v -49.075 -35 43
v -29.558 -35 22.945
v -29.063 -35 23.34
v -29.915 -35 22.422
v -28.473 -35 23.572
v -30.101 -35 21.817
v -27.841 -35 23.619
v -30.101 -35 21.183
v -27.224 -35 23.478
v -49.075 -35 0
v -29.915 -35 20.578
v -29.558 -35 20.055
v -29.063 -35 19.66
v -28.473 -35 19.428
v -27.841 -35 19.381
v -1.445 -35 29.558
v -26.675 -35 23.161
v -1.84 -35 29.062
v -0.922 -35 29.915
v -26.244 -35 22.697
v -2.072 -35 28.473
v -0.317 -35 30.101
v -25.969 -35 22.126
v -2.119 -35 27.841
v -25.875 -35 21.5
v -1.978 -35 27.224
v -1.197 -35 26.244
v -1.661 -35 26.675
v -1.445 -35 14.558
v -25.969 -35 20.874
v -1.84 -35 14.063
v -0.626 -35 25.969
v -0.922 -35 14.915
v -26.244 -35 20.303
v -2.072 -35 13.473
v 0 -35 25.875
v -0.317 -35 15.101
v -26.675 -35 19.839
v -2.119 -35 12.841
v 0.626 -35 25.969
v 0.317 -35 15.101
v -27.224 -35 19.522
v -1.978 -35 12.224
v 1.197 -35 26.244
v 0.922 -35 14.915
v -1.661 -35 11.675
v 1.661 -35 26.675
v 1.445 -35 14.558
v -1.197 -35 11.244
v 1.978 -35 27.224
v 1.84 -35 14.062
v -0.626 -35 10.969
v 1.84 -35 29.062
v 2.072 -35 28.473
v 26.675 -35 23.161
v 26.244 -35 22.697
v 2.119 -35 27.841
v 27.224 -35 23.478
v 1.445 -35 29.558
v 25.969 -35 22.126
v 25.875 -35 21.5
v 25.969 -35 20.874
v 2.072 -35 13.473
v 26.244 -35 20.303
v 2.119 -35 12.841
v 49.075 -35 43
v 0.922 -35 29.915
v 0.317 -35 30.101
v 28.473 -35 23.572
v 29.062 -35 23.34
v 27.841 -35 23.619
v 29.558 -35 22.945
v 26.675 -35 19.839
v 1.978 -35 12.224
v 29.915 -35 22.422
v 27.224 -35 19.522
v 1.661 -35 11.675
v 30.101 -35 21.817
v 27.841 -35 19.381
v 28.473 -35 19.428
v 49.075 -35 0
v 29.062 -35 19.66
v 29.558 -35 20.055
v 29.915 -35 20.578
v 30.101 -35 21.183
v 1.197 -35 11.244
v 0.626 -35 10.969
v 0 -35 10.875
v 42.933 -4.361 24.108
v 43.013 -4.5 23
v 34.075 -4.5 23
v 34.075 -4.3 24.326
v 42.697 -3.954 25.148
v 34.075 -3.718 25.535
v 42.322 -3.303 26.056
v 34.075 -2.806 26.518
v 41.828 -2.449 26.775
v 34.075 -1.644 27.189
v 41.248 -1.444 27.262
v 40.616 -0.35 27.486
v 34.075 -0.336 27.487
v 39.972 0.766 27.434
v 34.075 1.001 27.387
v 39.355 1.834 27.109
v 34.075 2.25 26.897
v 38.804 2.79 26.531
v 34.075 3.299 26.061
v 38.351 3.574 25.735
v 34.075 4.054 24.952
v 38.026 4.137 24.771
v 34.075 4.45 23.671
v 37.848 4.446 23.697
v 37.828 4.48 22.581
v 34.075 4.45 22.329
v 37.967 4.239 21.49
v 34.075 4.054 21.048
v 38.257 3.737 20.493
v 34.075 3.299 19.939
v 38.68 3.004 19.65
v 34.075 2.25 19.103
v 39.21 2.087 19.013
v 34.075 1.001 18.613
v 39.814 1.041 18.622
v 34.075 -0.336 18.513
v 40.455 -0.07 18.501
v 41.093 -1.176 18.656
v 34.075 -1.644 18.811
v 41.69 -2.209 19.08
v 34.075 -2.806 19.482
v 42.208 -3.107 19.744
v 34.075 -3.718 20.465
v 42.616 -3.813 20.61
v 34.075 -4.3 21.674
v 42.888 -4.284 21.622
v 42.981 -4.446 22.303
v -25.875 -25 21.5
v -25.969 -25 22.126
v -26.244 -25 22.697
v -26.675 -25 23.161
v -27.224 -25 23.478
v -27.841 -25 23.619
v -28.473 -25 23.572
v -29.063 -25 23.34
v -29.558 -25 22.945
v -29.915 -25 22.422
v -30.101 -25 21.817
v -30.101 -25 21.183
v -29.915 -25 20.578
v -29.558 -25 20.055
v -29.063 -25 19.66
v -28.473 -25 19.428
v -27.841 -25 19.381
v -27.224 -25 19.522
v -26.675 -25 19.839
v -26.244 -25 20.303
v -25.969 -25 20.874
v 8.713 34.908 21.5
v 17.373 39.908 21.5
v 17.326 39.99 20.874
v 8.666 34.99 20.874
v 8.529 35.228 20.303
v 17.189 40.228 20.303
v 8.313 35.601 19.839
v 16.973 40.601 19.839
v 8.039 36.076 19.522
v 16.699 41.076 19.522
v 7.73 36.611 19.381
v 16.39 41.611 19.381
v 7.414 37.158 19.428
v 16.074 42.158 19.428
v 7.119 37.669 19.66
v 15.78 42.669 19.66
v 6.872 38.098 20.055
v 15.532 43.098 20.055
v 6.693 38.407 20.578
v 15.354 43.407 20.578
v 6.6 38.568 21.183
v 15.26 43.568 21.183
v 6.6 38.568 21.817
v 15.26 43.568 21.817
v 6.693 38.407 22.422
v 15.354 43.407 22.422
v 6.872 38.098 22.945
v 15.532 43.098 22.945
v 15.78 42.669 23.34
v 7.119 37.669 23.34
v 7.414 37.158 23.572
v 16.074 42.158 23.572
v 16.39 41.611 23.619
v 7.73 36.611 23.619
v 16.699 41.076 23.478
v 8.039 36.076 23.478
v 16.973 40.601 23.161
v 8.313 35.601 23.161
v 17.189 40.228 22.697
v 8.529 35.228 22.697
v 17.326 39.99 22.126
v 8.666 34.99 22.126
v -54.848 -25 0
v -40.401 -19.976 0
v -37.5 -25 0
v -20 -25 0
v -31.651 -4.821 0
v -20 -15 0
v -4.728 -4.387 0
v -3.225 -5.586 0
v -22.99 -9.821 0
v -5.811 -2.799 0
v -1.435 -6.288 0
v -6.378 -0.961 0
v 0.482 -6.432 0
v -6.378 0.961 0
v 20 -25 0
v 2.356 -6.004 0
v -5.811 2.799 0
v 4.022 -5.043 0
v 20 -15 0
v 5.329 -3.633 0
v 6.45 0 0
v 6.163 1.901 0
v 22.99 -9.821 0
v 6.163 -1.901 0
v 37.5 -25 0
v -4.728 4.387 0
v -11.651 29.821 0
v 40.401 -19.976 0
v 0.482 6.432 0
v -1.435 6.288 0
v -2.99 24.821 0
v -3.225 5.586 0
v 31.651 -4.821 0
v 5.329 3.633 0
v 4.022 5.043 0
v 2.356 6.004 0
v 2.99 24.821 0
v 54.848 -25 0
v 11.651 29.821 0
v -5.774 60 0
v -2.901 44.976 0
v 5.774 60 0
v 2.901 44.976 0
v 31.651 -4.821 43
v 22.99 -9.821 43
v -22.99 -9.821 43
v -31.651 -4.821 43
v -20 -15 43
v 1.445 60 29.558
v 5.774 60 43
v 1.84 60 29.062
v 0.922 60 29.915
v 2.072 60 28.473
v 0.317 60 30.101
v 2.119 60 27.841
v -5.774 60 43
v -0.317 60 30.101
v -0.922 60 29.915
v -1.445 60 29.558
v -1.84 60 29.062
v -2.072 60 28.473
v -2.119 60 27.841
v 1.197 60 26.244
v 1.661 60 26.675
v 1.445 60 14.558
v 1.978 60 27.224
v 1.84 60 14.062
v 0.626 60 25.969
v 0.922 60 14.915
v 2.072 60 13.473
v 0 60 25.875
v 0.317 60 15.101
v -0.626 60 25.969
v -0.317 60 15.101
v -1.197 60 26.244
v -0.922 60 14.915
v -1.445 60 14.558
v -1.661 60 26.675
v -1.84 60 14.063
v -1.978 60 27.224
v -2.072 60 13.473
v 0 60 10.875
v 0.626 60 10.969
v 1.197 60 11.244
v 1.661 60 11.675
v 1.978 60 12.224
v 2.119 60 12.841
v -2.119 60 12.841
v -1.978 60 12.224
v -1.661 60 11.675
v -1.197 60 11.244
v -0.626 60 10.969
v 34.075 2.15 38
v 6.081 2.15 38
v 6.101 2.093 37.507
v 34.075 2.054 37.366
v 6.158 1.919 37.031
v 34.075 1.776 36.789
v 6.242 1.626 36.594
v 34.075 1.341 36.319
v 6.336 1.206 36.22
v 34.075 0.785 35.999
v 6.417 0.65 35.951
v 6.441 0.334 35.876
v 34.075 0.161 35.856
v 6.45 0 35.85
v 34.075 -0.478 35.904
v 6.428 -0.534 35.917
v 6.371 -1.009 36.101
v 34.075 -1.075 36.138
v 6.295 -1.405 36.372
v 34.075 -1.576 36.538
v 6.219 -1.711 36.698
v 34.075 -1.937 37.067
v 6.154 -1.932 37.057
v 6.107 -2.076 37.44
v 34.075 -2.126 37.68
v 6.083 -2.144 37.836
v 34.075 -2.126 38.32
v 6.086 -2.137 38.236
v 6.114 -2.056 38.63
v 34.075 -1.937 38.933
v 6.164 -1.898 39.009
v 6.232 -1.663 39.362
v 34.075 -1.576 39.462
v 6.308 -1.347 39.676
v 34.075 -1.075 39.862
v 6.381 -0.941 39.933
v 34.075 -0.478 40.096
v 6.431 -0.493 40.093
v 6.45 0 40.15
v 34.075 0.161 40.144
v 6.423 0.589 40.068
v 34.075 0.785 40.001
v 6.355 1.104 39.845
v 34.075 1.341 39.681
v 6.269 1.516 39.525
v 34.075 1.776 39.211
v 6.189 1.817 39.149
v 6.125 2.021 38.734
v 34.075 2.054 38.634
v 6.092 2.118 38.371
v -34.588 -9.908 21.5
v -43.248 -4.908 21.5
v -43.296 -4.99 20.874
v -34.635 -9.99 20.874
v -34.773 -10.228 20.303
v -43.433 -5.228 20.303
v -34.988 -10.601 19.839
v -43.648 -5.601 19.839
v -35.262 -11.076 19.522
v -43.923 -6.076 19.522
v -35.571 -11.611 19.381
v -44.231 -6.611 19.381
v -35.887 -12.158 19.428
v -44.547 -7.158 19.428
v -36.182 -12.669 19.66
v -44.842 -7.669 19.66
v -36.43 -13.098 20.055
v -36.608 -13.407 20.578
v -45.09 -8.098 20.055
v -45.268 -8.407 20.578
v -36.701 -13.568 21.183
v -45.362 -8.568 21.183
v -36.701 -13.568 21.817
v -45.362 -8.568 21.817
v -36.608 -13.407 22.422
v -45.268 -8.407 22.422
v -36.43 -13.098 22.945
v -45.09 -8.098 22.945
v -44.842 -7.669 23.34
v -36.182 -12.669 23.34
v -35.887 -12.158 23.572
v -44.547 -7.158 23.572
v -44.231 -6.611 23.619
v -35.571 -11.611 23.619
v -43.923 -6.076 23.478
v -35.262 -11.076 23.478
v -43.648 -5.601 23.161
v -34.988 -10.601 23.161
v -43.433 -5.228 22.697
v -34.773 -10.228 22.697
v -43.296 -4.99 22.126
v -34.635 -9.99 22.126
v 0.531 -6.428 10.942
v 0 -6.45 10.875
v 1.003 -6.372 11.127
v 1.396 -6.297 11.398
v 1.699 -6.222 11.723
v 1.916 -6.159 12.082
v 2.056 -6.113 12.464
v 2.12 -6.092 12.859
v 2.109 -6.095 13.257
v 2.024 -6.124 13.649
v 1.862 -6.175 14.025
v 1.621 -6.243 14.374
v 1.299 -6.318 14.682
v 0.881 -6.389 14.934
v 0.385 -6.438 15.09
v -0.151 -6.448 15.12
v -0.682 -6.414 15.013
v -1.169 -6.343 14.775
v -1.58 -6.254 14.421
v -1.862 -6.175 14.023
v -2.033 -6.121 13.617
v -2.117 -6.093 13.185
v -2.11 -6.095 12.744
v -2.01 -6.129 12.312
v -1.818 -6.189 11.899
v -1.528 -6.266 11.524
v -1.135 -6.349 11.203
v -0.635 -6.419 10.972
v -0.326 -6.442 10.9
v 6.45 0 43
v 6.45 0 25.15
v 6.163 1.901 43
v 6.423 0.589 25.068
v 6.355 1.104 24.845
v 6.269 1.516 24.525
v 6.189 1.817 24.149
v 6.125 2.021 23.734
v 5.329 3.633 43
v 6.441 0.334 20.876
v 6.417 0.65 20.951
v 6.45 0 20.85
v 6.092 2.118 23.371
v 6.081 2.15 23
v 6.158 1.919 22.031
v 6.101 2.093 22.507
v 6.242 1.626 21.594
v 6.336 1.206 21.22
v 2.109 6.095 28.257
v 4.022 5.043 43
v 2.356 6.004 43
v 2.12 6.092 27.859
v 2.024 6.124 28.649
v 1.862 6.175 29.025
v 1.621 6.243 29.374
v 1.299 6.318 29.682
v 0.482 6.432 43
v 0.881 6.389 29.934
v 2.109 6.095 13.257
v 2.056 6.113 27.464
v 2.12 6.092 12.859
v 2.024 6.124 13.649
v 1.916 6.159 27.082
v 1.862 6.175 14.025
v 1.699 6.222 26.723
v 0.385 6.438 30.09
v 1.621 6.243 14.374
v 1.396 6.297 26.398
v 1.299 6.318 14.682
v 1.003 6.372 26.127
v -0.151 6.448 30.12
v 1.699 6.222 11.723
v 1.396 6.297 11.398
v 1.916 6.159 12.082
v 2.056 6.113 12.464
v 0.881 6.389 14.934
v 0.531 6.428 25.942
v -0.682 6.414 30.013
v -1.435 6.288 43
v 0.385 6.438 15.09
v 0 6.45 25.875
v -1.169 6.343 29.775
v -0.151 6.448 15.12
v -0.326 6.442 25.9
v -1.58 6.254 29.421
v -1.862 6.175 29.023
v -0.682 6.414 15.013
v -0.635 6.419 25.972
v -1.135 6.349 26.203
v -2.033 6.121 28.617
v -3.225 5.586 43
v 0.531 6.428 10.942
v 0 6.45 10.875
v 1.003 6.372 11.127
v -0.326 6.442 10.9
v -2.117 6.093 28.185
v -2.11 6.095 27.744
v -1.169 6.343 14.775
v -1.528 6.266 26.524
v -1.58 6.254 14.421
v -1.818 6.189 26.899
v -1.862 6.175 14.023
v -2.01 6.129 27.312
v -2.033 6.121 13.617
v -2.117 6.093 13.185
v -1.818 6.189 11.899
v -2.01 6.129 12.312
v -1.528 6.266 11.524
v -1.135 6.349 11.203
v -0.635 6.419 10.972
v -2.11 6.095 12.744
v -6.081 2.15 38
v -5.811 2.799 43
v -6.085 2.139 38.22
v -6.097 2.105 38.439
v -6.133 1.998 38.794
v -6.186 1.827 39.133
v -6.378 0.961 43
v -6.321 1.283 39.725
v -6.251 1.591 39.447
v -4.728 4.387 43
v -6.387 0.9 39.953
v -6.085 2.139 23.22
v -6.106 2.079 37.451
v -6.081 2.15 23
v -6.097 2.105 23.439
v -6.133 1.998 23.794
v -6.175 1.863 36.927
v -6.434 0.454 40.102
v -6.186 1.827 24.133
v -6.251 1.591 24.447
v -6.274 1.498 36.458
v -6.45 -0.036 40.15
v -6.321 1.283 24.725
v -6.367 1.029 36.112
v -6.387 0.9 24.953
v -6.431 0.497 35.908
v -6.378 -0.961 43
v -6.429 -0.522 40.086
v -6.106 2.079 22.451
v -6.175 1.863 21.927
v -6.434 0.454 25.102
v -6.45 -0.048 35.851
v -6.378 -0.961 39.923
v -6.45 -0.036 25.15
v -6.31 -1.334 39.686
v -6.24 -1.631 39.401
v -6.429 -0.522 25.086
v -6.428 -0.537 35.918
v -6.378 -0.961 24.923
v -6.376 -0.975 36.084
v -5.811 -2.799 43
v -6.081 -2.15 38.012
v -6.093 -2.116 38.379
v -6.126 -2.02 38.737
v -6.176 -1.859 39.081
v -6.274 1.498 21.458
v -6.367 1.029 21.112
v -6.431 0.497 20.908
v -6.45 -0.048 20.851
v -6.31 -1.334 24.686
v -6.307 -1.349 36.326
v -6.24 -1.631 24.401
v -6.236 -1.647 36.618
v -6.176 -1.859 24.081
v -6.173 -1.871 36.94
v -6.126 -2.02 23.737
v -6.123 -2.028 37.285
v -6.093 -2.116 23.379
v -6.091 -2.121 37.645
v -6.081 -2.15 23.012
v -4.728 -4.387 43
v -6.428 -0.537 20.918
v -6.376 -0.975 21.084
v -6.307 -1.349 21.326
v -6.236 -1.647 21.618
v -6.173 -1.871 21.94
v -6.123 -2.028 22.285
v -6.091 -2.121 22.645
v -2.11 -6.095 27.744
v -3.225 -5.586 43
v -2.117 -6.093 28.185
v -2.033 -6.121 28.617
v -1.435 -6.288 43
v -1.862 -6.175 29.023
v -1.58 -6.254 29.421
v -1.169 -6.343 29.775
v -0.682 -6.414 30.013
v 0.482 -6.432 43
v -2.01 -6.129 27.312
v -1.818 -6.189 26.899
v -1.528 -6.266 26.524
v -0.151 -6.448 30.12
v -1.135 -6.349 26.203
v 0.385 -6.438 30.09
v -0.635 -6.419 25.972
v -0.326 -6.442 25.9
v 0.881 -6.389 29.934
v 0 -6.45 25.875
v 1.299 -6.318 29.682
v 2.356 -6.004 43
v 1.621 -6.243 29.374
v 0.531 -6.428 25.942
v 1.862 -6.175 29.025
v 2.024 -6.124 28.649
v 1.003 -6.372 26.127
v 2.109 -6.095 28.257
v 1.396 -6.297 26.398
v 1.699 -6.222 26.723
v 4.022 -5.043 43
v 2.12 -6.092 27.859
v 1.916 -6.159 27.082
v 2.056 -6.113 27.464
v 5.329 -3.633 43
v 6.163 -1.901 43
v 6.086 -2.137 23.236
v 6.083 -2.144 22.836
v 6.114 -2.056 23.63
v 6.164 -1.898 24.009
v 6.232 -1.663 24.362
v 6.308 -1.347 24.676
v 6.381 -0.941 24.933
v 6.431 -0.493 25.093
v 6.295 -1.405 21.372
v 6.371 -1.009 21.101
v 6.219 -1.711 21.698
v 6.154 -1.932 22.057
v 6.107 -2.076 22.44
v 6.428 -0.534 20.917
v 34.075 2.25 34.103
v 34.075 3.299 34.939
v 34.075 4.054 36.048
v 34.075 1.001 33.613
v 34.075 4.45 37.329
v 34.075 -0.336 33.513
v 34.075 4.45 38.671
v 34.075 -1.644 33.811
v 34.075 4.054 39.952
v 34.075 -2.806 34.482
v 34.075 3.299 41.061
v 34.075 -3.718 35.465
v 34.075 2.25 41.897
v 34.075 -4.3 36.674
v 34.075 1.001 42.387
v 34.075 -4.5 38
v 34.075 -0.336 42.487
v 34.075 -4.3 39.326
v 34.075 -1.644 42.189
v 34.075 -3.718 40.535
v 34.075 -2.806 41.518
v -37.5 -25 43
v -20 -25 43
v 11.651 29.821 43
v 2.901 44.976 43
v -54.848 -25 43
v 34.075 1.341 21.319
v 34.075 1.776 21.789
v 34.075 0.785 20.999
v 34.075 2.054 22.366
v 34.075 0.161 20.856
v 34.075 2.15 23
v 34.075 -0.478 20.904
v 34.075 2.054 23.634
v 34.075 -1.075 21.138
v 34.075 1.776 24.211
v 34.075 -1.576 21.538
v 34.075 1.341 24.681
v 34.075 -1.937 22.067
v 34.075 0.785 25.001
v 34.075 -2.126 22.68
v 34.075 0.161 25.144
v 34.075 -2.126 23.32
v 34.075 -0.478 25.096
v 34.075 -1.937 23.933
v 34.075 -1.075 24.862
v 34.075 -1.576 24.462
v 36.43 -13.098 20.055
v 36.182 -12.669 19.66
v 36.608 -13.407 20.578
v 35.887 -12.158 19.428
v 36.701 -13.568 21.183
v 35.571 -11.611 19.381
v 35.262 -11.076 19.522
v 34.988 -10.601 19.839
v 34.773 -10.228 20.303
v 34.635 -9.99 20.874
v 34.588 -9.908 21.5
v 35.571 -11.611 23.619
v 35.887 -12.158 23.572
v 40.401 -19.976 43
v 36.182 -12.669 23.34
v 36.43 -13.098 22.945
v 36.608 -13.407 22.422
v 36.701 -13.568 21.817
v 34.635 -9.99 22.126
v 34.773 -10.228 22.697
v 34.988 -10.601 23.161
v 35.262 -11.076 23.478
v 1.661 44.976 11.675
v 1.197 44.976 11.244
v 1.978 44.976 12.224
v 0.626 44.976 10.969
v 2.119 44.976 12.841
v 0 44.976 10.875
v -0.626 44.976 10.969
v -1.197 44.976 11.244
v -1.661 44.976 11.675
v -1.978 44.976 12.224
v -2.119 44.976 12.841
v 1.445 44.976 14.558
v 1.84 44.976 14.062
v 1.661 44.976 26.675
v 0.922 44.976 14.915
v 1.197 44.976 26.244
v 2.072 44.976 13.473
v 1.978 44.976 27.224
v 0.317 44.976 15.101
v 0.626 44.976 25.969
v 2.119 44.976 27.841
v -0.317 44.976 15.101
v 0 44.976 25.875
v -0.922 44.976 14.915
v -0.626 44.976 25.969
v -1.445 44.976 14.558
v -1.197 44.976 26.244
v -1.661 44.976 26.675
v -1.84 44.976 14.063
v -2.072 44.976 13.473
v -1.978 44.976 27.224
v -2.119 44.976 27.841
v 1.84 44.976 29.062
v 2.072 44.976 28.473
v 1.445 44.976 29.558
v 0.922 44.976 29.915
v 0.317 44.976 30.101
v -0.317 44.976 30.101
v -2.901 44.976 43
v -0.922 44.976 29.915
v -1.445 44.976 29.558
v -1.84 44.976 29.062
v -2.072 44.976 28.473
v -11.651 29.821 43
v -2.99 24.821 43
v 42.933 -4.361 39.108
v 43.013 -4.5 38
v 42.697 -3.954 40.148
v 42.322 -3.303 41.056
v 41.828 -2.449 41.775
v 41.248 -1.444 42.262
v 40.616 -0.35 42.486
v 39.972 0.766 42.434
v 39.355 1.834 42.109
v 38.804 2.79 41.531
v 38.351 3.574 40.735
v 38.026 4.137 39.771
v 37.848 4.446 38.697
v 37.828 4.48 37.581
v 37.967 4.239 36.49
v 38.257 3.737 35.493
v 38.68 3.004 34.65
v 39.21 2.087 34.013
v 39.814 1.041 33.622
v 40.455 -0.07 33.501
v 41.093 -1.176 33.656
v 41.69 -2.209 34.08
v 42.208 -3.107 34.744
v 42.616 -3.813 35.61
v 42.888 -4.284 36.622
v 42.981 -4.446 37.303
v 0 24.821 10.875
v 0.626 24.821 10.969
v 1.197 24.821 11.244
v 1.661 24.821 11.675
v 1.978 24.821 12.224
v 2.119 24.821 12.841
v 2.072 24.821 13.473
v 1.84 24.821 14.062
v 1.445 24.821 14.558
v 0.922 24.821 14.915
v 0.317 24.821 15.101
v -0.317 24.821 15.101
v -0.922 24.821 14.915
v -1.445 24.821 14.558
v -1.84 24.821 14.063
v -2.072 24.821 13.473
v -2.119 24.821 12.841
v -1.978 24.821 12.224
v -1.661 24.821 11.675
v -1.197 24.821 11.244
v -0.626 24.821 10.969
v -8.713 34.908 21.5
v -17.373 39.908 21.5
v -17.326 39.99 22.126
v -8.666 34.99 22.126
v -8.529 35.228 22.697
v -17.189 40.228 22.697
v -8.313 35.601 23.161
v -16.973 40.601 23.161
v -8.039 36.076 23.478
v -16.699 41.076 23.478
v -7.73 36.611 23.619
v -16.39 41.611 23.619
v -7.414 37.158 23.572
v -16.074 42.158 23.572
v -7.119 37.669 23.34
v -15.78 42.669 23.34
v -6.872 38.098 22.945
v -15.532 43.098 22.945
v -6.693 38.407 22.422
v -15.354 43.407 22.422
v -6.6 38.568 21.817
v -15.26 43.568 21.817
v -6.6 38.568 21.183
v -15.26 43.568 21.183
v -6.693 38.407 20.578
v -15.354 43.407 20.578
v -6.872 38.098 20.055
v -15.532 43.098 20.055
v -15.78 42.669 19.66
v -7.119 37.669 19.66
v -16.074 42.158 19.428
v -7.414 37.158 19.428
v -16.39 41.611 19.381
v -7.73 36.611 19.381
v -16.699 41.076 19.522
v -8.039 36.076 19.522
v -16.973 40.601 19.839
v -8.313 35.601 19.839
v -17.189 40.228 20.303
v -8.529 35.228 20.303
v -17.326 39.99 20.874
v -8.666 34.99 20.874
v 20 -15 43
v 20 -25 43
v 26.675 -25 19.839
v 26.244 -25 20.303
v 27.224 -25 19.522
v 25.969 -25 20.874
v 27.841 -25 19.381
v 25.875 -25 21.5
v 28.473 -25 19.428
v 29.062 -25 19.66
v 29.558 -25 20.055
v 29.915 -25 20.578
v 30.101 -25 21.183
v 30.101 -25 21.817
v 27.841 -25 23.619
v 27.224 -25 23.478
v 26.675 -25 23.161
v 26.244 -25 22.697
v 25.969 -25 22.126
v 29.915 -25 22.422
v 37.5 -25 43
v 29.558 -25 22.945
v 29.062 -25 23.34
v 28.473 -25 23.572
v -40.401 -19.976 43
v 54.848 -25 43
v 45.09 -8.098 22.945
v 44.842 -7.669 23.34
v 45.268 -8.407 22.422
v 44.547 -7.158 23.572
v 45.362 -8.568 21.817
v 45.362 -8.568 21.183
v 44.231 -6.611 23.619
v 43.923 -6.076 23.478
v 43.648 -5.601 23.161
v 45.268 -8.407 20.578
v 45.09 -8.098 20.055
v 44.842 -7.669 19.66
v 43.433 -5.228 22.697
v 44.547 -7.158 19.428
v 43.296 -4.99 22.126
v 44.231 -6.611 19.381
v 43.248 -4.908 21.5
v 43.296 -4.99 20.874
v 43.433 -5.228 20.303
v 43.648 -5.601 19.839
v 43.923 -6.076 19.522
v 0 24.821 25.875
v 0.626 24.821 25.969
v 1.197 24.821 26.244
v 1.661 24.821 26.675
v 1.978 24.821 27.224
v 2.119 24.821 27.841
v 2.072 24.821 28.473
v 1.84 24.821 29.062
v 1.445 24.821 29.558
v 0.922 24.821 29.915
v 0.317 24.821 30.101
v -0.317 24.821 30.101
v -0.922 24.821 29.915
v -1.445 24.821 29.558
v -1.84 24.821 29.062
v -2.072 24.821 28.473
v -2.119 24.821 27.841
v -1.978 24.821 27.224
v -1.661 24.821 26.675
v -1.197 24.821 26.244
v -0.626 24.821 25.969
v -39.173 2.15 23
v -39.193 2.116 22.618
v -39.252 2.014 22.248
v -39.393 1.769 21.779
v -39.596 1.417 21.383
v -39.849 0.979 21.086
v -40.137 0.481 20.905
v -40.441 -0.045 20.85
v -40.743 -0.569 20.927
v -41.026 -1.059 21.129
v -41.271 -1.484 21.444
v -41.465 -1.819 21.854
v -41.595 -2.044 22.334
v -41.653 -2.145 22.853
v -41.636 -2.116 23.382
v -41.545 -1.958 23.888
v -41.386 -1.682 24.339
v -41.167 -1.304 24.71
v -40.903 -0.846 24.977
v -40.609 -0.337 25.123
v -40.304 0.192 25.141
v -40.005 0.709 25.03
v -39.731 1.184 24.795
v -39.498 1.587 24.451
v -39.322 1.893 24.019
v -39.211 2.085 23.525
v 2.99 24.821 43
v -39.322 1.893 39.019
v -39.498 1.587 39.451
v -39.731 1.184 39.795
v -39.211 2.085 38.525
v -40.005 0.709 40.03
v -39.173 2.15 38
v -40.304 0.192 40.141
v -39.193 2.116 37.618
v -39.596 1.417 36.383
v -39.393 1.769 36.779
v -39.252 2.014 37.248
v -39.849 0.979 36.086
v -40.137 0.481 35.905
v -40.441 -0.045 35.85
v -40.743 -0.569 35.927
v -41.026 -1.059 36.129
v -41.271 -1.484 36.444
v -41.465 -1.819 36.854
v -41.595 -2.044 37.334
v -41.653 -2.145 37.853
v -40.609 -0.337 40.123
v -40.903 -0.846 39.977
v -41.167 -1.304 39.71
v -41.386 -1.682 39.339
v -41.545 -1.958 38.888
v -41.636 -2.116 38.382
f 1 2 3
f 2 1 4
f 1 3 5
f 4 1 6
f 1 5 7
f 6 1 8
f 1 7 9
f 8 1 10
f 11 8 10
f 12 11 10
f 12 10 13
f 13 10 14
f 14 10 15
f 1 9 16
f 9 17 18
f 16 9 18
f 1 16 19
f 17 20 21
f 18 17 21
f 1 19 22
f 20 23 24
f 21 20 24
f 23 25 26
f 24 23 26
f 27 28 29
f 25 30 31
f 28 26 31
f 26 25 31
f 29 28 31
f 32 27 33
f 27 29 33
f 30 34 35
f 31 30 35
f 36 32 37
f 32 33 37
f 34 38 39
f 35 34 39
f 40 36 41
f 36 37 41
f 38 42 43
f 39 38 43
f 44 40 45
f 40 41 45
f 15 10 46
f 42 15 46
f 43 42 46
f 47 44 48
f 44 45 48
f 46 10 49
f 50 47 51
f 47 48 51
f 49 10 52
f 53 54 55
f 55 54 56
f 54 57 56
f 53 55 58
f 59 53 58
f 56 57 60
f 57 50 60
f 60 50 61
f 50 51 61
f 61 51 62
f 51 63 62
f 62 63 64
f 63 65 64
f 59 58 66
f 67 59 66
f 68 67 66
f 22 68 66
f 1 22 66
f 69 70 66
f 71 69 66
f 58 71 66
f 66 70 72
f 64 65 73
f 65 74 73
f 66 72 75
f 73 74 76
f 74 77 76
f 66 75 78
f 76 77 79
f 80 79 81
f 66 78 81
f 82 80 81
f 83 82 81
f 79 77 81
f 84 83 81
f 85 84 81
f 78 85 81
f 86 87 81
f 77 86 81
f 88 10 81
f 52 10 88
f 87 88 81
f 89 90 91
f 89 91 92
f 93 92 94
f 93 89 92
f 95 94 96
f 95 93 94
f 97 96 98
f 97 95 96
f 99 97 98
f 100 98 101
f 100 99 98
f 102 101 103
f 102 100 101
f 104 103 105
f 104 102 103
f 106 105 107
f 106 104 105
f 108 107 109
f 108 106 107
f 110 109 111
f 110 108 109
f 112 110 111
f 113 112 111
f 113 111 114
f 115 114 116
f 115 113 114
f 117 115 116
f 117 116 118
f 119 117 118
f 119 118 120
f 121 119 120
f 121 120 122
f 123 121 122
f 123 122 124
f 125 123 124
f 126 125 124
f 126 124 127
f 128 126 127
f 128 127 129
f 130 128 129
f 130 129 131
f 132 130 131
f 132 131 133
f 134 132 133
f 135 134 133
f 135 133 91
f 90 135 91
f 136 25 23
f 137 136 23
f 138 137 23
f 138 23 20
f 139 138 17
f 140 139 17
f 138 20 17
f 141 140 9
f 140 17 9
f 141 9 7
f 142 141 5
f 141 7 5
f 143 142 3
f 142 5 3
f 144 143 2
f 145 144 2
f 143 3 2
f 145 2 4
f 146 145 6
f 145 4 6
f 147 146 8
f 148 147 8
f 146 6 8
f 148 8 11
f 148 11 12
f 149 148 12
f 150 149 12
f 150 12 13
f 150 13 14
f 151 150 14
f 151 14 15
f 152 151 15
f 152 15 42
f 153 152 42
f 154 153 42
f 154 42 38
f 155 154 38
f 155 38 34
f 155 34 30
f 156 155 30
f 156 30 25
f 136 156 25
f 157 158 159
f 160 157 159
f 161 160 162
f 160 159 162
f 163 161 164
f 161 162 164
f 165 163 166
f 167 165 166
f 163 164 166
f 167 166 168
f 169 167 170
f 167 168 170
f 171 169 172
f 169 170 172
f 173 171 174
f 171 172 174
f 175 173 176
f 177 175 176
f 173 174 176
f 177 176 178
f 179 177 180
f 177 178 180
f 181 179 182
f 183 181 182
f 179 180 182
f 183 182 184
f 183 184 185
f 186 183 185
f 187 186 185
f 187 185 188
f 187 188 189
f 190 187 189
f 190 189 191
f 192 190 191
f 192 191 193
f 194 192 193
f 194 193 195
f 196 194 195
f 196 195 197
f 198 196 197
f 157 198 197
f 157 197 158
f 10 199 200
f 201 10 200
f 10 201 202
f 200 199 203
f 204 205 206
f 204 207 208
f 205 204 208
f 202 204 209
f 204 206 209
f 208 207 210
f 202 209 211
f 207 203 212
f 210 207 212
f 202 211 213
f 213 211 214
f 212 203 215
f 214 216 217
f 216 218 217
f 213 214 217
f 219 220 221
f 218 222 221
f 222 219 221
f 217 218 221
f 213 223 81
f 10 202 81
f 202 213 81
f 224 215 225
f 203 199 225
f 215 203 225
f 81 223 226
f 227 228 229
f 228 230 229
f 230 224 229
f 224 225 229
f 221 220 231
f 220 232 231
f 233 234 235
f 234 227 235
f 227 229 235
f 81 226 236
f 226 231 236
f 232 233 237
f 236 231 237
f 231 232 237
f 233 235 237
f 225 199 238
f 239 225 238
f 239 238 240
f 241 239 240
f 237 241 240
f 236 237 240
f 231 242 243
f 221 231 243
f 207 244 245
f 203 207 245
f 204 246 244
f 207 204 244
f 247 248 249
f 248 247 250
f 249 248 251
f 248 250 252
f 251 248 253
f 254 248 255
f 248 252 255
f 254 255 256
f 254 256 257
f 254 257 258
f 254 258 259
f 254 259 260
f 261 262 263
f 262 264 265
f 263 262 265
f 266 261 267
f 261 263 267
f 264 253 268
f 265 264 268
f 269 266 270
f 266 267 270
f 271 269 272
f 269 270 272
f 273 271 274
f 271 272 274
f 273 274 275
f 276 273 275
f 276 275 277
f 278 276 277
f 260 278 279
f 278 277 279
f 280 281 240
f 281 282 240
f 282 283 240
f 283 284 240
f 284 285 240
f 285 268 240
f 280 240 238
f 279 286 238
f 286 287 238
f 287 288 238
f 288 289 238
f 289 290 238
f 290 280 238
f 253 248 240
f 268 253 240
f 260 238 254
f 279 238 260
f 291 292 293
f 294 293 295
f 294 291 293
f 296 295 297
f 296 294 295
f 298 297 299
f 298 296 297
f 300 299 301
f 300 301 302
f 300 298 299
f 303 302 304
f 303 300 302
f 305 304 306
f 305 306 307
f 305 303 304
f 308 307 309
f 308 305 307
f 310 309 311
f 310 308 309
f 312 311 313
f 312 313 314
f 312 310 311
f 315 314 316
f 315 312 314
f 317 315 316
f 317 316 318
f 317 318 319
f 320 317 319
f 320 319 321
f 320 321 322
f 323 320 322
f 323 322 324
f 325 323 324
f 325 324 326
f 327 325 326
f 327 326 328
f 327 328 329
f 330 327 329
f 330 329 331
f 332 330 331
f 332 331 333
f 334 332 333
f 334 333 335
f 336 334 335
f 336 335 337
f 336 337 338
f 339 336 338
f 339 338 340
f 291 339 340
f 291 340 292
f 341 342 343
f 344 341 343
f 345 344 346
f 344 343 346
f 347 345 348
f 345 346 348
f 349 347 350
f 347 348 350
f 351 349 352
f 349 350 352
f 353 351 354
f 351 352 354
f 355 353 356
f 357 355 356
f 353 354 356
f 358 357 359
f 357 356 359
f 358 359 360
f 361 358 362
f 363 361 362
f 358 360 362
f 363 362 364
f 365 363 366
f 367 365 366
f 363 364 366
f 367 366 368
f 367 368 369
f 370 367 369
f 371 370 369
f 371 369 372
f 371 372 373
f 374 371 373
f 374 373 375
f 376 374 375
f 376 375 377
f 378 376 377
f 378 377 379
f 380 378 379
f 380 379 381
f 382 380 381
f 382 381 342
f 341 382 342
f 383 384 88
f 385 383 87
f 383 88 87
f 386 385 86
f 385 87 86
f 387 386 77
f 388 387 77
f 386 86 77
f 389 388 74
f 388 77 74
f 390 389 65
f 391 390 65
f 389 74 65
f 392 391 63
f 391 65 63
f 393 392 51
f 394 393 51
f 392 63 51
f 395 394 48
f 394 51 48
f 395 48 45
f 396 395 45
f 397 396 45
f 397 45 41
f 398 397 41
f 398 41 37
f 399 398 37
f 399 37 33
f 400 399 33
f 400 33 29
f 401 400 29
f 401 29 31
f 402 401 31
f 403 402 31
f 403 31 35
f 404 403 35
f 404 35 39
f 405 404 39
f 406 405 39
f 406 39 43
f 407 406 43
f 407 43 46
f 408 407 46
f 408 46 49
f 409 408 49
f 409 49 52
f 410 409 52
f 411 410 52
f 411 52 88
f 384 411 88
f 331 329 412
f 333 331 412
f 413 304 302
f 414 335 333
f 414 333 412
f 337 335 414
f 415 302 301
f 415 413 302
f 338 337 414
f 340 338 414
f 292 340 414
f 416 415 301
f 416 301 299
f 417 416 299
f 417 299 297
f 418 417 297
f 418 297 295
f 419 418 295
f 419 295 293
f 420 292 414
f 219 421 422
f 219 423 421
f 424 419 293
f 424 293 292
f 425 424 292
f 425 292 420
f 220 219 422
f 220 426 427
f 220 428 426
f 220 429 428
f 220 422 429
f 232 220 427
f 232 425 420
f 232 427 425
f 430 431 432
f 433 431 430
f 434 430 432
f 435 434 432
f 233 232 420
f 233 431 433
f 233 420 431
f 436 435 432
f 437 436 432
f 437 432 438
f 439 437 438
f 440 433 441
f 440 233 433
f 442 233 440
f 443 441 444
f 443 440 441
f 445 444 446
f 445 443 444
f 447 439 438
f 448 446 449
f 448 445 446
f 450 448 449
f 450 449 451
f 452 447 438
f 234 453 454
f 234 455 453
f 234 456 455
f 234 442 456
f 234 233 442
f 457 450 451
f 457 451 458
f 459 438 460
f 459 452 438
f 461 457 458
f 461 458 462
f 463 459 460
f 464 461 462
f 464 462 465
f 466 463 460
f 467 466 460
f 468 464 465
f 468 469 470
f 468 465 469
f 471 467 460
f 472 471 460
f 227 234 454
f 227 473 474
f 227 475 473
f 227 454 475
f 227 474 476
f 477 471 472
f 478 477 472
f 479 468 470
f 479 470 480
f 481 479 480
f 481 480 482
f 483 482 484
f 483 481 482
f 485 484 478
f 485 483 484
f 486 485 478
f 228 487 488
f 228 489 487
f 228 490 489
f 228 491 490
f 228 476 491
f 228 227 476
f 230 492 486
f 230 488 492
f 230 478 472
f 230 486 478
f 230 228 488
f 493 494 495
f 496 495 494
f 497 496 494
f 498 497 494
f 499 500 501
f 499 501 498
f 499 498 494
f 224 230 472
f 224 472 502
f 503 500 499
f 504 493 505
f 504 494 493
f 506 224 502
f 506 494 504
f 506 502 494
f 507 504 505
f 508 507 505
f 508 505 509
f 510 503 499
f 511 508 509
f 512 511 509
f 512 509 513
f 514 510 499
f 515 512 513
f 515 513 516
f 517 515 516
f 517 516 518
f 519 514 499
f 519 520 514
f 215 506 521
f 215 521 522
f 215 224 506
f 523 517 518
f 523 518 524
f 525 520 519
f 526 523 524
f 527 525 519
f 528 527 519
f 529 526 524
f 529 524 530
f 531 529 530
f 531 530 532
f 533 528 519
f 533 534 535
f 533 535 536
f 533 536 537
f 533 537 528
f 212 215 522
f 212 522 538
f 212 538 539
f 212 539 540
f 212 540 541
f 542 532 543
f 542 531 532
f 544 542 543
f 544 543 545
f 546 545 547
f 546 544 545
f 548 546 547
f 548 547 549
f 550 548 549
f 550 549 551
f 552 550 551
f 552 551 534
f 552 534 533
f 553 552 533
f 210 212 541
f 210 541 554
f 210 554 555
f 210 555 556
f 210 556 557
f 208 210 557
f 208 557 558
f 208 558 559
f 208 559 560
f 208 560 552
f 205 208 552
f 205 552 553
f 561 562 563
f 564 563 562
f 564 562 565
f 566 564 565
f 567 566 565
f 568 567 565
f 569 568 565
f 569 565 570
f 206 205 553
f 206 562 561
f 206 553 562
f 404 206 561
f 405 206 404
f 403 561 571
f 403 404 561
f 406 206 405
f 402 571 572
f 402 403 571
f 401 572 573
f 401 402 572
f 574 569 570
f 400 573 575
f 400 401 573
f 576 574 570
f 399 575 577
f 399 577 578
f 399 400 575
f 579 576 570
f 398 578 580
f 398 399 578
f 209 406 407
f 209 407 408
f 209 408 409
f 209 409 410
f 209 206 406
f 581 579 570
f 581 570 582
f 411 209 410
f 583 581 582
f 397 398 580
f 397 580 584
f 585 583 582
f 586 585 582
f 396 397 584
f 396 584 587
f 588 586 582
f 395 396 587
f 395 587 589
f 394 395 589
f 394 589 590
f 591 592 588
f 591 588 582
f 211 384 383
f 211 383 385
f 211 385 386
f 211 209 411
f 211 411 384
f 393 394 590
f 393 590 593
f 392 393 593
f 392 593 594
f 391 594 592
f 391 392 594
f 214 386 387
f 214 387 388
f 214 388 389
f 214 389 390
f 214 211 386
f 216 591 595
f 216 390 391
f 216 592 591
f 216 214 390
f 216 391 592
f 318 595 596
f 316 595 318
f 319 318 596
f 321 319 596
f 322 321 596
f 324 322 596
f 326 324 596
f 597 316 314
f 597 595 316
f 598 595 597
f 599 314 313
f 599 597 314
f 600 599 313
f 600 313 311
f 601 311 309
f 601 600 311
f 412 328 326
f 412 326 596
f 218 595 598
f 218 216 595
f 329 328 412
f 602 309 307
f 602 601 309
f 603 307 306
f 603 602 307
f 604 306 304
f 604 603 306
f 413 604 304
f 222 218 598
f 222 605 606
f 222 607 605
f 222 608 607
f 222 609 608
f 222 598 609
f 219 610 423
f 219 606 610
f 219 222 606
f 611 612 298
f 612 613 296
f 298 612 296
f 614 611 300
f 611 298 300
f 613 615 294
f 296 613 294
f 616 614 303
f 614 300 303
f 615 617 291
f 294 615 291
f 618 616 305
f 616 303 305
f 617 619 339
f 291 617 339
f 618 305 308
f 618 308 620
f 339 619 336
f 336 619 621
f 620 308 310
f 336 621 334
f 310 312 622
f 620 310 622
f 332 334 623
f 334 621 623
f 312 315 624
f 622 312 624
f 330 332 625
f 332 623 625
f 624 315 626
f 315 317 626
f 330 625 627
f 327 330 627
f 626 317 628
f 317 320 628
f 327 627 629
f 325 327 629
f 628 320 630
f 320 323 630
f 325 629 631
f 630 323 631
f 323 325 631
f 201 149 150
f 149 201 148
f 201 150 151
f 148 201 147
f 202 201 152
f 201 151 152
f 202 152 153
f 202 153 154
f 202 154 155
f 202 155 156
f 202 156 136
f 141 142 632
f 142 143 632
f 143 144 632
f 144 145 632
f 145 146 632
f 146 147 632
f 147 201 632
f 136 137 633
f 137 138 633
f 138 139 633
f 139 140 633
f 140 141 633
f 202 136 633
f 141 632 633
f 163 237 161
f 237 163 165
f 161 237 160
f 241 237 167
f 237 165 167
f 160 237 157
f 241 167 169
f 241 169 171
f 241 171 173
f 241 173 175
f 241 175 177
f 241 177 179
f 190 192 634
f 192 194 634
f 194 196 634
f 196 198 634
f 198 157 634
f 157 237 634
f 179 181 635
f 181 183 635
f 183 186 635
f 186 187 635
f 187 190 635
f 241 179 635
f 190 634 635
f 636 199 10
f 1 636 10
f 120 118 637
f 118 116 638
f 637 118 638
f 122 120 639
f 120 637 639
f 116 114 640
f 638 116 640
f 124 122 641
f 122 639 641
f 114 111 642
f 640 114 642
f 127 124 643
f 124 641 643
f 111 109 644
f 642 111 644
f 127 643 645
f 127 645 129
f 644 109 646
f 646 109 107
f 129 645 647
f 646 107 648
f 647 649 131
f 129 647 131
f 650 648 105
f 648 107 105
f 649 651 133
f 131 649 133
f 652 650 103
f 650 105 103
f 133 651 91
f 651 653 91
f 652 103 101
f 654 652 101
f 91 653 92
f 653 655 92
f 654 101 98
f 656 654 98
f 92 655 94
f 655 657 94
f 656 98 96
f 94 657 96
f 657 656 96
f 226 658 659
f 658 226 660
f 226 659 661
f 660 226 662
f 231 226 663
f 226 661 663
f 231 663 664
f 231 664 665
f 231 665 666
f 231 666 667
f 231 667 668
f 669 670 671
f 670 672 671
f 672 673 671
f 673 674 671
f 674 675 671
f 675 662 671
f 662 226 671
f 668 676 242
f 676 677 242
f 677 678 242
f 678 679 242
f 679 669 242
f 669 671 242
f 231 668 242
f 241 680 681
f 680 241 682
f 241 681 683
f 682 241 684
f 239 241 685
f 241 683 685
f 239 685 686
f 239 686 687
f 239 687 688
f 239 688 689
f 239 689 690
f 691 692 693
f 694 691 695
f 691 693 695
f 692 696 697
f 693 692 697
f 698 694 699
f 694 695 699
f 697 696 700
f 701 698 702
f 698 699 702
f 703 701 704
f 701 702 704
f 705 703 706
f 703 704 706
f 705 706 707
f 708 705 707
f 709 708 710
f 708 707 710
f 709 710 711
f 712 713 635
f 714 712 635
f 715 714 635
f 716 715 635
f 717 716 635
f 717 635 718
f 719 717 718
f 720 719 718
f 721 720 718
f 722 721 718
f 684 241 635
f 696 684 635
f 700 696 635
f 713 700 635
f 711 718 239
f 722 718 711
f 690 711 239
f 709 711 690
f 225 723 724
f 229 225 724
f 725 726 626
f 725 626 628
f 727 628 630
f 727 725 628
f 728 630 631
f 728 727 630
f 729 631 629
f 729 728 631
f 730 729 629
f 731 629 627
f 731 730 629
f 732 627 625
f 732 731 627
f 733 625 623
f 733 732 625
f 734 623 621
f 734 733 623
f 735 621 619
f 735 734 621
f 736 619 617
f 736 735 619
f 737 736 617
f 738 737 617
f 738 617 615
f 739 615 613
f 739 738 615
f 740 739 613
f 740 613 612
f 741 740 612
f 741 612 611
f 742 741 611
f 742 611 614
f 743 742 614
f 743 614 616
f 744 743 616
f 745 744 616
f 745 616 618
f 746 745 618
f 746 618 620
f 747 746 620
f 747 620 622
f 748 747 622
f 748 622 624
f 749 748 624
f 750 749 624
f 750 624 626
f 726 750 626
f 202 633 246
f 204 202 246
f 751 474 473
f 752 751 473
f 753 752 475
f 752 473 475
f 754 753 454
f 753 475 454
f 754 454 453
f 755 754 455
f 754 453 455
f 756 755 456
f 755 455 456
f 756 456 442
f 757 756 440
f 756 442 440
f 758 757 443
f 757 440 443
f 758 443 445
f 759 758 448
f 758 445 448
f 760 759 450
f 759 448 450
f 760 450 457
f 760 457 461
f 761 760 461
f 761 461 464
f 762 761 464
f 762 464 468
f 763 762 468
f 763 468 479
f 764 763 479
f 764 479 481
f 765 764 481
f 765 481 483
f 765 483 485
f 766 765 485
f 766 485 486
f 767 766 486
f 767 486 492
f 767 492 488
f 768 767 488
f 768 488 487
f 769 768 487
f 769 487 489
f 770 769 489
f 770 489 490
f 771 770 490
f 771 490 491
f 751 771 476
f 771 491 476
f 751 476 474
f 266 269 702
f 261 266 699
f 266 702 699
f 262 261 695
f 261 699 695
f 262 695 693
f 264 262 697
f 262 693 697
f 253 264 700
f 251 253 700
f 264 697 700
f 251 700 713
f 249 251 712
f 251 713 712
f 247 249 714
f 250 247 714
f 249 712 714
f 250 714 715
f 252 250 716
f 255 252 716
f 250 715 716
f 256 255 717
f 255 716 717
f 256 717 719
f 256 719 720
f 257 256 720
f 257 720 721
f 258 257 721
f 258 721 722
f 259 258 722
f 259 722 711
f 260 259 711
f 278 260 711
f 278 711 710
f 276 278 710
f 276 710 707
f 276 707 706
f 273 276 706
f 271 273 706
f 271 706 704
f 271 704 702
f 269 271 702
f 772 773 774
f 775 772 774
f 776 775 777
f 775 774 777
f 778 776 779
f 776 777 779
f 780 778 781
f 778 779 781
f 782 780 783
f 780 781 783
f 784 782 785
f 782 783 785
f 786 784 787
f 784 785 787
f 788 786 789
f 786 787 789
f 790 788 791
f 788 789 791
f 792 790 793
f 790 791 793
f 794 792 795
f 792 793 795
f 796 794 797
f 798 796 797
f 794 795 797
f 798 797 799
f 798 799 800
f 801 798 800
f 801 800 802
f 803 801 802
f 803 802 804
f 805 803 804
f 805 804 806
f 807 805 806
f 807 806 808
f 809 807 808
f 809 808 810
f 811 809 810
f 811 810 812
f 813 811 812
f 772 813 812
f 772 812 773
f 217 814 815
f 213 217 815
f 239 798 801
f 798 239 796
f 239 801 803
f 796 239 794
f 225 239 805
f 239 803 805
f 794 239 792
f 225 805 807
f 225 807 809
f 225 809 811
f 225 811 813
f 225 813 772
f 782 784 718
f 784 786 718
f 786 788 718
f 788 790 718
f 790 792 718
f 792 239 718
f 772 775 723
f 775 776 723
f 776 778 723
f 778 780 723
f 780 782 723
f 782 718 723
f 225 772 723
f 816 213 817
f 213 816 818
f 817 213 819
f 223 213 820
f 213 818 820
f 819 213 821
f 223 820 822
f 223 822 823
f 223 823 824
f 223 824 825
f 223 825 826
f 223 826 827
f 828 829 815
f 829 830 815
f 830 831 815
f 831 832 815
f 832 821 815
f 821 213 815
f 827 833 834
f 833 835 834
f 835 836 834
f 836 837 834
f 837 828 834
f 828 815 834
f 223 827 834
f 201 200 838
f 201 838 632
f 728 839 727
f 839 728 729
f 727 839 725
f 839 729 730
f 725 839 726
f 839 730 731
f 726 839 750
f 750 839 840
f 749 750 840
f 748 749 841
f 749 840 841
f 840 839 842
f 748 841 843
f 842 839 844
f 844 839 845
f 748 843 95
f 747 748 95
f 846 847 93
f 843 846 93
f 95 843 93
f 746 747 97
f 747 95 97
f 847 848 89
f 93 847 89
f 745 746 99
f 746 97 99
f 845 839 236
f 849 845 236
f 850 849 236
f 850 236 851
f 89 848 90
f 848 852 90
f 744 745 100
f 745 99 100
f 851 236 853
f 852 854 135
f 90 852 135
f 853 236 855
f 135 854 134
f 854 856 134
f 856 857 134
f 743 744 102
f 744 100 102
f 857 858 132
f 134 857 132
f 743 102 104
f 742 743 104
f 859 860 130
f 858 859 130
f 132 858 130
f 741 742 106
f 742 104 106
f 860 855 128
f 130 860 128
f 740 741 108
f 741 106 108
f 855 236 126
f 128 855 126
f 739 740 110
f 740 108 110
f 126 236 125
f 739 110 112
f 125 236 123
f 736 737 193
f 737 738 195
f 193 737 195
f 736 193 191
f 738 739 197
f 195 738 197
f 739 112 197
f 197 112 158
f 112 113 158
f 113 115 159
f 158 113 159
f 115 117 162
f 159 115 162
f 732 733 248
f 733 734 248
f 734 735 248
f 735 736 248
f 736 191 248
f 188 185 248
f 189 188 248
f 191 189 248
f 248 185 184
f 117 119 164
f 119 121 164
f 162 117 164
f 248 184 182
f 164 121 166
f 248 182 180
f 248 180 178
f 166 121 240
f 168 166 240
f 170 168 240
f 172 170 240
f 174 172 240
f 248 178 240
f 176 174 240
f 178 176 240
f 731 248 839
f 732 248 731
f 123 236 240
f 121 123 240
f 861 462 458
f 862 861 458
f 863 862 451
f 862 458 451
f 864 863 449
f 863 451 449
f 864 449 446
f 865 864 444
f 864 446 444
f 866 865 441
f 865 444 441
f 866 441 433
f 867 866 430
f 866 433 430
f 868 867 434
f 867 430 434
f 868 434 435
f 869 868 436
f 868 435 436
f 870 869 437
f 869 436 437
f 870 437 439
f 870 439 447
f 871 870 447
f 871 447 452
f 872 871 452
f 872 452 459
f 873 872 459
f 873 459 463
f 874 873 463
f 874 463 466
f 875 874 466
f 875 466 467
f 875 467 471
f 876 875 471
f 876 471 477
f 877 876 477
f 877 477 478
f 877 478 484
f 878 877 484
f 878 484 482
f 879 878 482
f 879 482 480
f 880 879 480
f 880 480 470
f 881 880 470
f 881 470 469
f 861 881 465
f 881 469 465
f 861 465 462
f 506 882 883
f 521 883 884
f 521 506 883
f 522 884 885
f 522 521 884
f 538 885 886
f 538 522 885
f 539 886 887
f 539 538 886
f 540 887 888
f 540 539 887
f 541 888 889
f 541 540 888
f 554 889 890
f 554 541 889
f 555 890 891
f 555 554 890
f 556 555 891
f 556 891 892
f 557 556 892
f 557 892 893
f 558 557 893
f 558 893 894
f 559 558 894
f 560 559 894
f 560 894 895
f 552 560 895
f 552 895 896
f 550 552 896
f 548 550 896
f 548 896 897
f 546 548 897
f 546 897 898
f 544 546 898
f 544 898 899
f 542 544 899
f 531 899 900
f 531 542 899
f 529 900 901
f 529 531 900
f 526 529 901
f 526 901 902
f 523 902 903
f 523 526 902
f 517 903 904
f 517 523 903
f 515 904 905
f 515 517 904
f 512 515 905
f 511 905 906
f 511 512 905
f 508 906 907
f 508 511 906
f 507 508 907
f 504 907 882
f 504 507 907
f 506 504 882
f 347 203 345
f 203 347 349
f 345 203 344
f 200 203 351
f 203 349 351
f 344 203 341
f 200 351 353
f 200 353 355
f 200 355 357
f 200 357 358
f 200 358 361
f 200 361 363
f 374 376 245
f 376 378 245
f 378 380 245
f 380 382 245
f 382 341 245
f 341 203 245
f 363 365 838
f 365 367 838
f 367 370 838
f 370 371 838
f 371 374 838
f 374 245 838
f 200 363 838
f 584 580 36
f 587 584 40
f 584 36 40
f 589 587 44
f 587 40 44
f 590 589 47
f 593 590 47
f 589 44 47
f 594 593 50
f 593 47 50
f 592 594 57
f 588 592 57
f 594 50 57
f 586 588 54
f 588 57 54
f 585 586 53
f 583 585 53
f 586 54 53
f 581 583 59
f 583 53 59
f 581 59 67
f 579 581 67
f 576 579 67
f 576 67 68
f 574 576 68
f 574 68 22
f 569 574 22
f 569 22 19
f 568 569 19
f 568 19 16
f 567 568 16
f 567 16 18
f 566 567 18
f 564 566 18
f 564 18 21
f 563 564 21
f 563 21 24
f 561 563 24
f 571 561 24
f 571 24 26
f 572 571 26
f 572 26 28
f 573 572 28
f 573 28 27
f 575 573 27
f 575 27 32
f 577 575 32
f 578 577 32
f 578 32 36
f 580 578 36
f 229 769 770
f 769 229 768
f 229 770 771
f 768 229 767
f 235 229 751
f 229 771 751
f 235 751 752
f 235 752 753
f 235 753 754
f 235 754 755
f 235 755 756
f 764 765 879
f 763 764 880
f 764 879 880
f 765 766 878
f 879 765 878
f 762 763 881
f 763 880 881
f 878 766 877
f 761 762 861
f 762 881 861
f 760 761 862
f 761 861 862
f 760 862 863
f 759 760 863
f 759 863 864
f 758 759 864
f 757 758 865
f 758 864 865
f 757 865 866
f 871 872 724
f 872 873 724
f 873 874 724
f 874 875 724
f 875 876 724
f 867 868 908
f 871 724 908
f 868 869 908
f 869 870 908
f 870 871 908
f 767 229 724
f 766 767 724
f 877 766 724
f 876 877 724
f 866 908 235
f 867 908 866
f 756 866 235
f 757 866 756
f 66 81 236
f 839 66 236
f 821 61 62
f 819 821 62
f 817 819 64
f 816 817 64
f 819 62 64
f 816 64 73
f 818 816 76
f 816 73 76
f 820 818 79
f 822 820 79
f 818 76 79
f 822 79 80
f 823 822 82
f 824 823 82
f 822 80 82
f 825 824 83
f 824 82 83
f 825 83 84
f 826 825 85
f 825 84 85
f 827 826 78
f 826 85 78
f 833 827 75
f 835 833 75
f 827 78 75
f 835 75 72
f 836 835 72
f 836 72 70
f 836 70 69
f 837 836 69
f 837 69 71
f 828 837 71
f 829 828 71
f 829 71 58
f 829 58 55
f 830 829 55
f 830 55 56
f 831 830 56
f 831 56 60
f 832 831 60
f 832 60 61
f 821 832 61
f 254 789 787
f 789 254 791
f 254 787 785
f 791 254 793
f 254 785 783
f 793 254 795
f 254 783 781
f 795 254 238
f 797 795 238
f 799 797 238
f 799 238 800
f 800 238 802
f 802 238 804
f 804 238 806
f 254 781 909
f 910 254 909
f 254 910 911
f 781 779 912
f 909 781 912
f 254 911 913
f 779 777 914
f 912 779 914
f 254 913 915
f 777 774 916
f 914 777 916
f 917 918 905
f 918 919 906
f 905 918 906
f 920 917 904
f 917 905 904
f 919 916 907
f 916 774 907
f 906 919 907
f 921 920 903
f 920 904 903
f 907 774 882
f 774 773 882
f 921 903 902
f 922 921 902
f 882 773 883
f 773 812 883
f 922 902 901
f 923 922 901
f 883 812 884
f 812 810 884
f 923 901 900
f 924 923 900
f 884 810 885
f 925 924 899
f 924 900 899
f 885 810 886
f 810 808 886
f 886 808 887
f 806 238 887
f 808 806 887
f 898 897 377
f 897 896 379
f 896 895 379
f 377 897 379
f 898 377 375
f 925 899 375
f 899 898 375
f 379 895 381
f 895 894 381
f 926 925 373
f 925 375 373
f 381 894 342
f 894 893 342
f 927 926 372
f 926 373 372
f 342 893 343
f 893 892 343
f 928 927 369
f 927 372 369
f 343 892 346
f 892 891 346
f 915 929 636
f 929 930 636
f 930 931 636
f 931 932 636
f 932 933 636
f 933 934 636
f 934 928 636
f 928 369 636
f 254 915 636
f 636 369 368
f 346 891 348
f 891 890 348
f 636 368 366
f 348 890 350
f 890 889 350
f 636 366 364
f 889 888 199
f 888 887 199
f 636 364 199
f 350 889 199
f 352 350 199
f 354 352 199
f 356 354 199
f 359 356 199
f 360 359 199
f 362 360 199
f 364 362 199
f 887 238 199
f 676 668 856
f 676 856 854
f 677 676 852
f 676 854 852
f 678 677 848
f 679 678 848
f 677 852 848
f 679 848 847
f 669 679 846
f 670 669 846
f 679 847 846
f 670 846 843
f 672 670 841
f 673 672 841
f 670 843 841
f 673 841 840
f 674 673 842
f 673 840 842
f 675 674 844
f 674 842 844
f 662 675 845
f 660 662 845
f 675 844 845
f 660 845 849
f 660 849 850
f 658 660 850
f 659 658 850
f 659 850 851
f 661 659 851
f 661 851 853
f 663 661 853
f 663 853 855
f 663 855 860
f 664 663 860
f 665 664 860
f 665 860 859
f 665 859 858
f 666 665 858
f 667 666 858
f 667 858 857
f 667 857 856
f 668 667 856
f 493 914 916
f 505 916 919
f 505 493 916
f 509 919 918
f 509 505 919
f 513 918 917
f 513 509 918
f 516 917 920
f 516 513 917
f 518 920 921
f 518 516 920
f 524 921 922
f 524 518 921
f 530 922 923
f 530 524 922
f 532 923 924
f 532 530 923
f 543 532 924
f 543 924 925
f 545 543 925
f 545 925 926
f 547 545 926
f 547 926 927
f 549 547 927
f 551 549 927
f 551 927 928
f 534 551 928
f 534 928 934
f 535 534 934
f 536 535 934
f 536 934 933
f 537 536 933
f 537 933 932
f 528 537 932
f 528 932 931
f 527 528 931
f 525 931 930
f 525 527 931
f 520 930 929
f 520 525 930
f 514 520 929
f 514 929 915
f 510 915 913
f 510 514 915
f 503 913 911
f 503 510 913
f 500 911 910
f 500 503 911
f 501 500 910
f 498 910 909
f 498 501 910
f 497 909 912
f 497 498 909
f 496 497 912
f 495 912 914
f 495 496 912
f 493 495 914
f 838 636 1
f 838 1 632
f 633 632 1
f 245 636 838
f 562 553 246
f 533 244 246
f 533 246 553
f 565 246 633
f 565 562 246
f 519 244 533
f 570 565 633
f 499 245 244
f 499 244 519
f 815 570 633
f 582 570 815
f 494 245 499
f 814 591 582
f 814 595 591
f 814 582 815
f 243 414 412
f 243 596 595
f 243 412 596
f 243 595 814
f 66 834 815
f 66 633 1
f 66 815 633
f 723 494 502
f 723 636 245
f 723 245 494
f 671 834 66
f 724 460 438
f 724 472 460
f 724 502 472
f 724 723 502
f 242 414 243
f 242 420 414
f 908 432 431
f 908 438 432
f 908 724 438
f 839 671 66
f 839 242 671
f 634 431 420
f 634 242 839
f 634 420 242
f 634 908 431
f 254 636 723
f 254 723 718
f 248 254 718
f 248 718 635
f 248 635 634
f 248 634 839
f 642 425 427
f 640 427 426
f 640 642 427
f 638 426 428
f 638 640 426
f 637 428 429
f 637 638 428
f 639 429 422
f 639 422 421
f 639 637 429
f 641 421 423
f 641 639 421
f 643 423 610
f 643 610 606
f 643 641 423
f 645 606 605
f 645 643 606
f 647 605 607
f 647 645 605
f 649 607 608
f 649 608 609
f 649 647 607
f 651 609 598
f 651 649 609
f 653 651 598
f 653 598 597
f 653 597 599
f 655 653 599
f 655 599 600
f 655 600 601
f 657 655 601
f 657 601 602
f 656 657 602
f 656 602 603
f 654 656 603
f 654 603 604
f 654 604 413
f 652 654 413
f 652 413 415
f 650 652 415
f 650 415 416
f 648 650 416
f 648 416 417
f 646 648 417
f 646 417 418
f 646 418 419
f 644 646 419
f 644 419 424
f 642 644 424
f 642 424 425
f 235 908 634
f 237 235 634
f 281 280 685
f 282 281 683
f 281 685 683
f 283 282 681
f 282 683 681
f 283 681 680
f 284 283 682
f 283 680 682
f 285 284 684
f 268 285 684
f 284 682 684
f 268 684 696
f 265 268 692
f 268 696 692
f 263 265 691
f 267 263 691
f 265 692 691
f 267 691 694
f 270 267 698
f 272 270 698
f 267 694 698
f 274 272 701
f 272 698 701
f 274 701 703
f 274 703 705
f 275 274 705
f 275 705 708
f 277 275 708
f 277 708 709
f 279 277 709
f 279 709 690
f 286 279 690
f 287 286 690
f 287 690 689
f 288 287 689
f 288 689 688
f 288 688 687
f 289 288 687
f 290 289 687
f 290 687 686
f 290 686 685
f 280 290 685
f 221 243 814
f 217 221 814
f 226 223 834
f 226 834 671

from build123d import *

# Parameters (mm, degrees)
SKETCH_1_R               = 6.45
EXTRUDE_1_DEPTH          = 43
CUT_EXTRUDE_3_DEPTH      = 92.963760979
SKETCH_3_R               = 2.125
CUT_EXTRUDE_4_DEPTH      = 15
PATTERN_CIRCULAR_1_COUNT = 3
SKETCH_4_R               = 2.125
CUT_EXTRUDE_5_DEPTH      = 118.823314048
SKETCH_6_R               = 2.15
CUT_EXTRUDE_7_DEPTH      = 128.471565491
SKETCH_7_R               = 4.5
CUT_EXTRUDE_8_DEPTH      = 15


with BuildPart() as part:
    # 草图1 → 凸台-拉伸1 (new body)
    with BuildSketch(Plane.XY):
        Polygon((5.773502692, 60), (-5.773502692, 60), (-54.848275573, -25), (-49.074772881, -35), (49.074772881, -35), (54.848275573, -25), align=None)
        Circle(SKETCH_1_R, mode=Mode.SUBTRACT)
    extrude(amount=EXTRUDE_1_DEPTH)

    # 草图2 → 切除-拉伸3 (cut, through all)
    with BuildSketch(Plane.XY.offset(43)):
        Polygon((5.759618943, 39.975952642), (0, 43.301270189), (-5.759618943, 39.975952642), (0, 30), align=None)
        Polygon((0, 43.301270189), (-2.900635095, 44.975952642), (-11.650635095, 29.820508076), (-2.990381057, 24.820508076), (0, 30), (-5.759618943, 39.975952642), align=None)
        Polygon((2.900635095, 44.975952642), (0, 43.301270189), (5.759618943, 39.975952642), (0, 30), (2.990381057, 24.820508076), (11.650635095, 29.820508076), align=None)
        Polygon((-22.990381057, -9.820508076), (-31.650635095, -4.820508076), (-40.400635095, -19.975952642), (-37.5, -21.650635095), (-37.5, -15), (-25.980762114, -15), align=None)
        Polygon((-37.5, -15), (-37.5, -21.650635095), (-31.740381057, -24.975952642), (-25.980762114, -15), align=None)
        Polygon((-31.740381057, -24.975952642), (-37.5, -21.650635095), (-37.5, -25), (-20, -25), (-20, -15), (-25.980762114, -15), align=None)
        Polygon((25.980762114, -15), (20, -15), (20, -25), (37.5, -25), (37.5, -21.650635095), (31.740381057, -24.975952642), align=None)
        Polygon((37.5, -15), (25.980762114, -15), (31.740381057, -24.975952642), (37.5, -21.650635095), align=None)
        Polygon((40.400635095, -19.975952642), (31.650635095, -4.820508076), (22.990381057, -9.820508076), (25.980762114, -15), (37.5, -15), (37.5, -21.650635095), align=None)
        Polygon((2.900635095, 44.975952642), (-2.900635095, 44.975952642), (0, 43.301270189), align=None)
        Polygon((-37.5, -21.650635095), (-40.400635095, -19.975952642), (-37.5, -25), align=None)
        Polygon((37.5, -25), (40.400635095, -19.975952642), (37.5, -21.650635095), align=None)
        Polygon((25.980762114, -15), (22.990381057, -9.820508076), (20, -15), align=None)
        Polygon((-20, -15), (-22.990381057, -9.820508076), (-25.980762114, -15), align=None)
        Polygon((0, 30), (-2.990381057, 24.820508076), (2.990381057, 24.820508076), align=None)
    extrude(amount=-CUT_EXTRUDE_3_DEPTH, mode=Mode.SUBTRACT)

    # 草图3 → 切除-拉伸4 (cut)
    with BuildSketch(Plane(origin=(-30.310889132, 17.5, 0), x_dir=(0, 0, 1), z_dir=(-0.8660254037844362, 0.5000000000000046, 0))):
        with Locations(Location((21.5, 28, 0), (0, 0, 270))):
            Circle(SKETCH_3_R)
        with Locations(Location((21.5, -28, 0), (0, 0, 90))):
            Circle(SKETCH_3_R)
    cut_extrude_4 = extrude(amount=-CUT_EXTRUDE_4_DEPTH, mode=Mode.SUBTRACT)

    # 阵列(圆周)1: 切除-拉伸4 ×3 about axis
    pattern_circular_1_axis = Axis((0, 0, 43), (0, 0, -1))
    for i in range(1, PATTERN_CIRCULAR_1_COUNT):
        add(cut_extrude_4.rotate(pattern_circular_1_axis, i * 360 / PATTERN_CIRCULAR_1_COUNT), mode=Mode.SUBTRACT)

    # 草图4 → 切除-拉伸5 (cut, through all)
    with BuildSketch(Plane.XZ.offset(35)):
        with Locations(Location((0, 13, 0), (0, 0, 270))):
            Circle(SKETCH_4_R)
        with Locations(Location((0, 28, 0), (0, 0, 270))):
            Circle(SKETCH_4_R)
    extrude(amount=-CUT_EXTRUDE_5_DEPTH, mode=Mode.SUBTRACT)

    # 草图6 → 切除-拉伸7 (cut, through all)
    with BuildSketch(Plane(origin=(49.074772881, 0, 0), x_dir=(0, 0, -1), z_dir=(-1, 0, 0))):
        with Locations(Location((-23, 0, 0), (0, 0, 270))):
            Circle(SKETCH_6_R)
        with Locations(Location((-38, 0, 0), (0, 0, 270))):
            Circle(SKETCH_6_R)
    extrude(amount=CUT_EXTRUDE_7_DEPTH, mode=Mode.SUBTRACT)

    # 草图7 → 切除-拉伸8 (cut)
    with BuildSketch(Plane(origin=(49.074772881, 0, 0), x_dir=(0, 0, -1), z_dir=(-1, 0, 0))):
        with Locations(Location((-38, 0, 0), (0, 0, 90))):
            Circle(SKETCH_7_R)
        with Locations(Location((-23, 0, 0), (0, 0, 90))):
            Circle(SKETCH_7_R)
    extrude(amount=CUT_EXTRUDE_8_DEPTH, mode=Mode.SUBTRACT)


solid = part.part
